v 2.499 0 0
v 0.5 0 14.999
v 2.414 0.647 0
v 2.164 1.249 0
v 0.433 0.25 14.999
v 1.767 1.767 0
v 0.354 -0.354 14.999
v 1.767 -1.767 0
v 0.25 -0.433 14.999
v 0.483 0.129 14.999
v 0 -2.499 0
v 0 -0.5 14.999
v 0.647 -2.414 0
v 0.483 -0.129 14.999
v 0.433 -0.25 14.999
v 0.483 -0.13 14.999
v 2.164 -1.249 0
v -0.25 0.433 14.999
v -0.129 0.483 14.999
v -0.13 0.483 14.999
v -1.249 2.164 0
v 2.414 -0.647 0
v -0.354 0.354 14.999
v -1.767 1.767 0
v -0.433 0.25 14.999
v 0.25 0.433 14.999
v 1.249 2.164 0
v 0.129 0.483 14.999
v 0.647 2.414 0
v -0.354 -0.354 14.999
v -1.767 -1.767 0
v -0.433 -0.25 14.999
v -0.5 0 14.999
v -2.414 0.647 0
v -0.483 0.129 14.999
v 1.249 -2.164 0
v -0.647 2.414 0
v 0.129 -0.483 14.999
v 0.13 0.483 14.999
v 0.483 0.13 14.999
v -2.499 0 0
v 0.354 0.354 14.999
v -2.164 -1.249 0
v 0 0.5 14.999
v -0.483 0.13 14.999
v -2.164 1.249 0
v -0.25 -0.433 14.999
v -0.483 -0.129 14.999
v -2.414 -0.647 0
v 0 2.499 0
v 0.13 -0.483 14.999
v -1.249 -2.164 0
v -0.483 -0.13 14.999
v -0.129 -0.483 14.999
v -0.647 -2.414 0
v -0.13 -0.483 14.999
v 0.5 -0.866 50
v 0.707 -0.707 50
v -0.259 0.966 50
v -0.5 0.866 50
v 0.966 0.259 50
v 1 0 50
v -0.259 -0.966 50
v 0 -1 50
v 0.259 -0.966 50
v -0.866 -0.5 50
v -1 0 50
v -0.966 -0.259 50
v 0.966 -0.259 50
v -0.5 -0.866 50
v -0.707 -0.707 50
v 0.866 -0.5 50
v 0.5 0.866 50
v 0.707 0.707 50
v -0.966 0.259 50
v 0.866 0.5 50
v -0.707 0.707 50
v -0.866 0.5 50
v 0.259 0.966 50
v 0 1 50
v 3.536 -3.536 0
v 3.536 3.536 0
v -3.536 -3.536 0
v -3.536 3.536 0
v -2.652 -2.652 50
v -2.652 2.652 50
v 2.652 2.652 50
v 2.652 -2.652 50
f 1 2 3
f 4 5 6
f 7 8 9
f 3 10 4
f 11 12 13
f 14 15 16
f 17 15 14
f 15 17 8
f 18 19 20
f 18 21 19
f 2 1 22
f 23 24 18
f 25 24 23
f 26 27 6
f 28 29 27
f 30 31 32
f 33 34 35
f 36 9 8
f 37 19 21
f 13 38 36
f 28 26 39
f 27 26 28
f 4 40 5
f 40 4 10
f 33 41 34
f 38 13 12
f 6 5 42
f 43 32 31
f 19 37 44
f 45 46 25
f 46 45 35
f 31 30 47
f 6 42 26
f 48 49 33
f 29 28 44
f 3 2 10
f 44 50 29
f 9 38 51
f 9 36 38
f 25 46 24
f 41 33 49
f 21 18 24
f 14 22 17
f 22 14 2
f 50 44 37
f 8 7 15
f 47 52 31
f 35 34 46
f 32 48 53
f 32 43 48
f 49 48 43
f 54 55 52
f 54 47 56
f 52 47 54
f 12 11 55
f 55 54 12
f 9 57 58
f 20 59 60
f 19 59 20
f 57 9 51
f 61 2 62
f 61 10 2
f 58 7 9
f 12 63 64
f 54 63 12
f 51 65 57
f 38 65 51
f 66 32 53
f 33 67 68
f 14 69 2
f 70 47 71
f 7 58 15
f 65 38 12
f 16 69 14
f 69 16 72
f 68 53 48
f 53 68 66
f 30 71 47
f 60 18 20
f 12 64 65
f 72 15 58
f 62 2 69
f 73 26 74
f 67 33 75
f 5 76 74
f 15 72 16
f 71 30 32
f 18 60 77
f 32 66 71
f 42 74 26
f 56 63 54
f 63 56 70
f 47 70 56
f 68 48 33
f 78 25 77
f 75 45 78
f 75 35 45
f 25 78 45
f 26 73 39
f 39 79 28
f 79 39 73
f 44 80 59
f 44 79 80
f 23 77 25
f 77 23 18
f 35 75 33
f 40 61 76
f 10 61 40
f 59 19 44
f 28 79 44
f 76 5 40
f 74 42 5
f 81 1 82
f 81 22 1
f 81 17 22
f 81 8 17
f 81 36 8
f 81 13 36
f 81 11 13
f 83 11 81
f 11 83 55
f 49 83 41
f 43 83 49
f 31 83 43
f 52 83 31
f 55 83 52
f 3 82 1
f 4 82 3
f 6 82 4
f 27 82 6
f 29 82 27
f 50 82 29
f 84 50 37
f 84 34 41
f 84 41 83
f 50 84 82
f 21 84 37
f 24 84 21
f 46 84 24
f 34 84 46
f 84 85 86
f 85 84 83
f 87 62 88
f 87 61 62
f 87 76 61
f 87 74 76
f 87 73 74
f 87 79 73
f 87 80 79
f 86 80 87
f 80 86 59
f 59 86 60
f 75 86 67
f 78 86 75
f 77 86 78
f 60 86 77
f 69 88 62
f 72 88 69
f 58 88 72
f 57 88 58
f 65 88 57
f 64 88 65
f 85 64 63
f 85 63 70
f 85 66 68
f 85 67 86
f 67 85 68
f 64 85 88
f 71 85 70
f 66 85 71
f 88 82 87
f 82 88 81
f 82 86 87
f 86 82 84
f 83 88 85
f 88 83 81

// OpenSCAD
// a special wall anchor with lost of adjustments
// (all sizes in millimenter)

module wall_anchor(
    drill_hole_dm = 8,  // drill hole diameter
    screw_dm = 5,       // screw diameter
    length = 50,     // anchor length
    oversize = 2,   // outer diameter oversize
    outer_taper = 0.75,     // outer taper factor
    inner_taper = 0.2,      // inner taper factore
    inner_taper_end = 0.3   // relative end of inner tape along length
) {
    
    difference() {
            
        outer_dm = drill_hole_dm + oversize;
        side_length = sqrt( pow(outer_dm, 2 ) / 2 );
        
        linear_extrude( height = length, scale = outer_taper )
           square( side_length, center = true);
            
        // hole
        abs_taper_end = length * inner_taper_end;
        taper_dm = screw_dm * inner_taper;
        
        translate( [0,0,-0.01])
        union() {
            $fn = 24;
            
            cylinder(d1 = screw_dm, d2 = taper_dm, h = abs_taper_end + 0.01);
            
            translate( [ 0, 0, abs_taper_end ])
            cylinder(d1 = taper_dm, h = length - abs_taper_end + 0.02);
        }
        
    }
}

wall_anchor();
